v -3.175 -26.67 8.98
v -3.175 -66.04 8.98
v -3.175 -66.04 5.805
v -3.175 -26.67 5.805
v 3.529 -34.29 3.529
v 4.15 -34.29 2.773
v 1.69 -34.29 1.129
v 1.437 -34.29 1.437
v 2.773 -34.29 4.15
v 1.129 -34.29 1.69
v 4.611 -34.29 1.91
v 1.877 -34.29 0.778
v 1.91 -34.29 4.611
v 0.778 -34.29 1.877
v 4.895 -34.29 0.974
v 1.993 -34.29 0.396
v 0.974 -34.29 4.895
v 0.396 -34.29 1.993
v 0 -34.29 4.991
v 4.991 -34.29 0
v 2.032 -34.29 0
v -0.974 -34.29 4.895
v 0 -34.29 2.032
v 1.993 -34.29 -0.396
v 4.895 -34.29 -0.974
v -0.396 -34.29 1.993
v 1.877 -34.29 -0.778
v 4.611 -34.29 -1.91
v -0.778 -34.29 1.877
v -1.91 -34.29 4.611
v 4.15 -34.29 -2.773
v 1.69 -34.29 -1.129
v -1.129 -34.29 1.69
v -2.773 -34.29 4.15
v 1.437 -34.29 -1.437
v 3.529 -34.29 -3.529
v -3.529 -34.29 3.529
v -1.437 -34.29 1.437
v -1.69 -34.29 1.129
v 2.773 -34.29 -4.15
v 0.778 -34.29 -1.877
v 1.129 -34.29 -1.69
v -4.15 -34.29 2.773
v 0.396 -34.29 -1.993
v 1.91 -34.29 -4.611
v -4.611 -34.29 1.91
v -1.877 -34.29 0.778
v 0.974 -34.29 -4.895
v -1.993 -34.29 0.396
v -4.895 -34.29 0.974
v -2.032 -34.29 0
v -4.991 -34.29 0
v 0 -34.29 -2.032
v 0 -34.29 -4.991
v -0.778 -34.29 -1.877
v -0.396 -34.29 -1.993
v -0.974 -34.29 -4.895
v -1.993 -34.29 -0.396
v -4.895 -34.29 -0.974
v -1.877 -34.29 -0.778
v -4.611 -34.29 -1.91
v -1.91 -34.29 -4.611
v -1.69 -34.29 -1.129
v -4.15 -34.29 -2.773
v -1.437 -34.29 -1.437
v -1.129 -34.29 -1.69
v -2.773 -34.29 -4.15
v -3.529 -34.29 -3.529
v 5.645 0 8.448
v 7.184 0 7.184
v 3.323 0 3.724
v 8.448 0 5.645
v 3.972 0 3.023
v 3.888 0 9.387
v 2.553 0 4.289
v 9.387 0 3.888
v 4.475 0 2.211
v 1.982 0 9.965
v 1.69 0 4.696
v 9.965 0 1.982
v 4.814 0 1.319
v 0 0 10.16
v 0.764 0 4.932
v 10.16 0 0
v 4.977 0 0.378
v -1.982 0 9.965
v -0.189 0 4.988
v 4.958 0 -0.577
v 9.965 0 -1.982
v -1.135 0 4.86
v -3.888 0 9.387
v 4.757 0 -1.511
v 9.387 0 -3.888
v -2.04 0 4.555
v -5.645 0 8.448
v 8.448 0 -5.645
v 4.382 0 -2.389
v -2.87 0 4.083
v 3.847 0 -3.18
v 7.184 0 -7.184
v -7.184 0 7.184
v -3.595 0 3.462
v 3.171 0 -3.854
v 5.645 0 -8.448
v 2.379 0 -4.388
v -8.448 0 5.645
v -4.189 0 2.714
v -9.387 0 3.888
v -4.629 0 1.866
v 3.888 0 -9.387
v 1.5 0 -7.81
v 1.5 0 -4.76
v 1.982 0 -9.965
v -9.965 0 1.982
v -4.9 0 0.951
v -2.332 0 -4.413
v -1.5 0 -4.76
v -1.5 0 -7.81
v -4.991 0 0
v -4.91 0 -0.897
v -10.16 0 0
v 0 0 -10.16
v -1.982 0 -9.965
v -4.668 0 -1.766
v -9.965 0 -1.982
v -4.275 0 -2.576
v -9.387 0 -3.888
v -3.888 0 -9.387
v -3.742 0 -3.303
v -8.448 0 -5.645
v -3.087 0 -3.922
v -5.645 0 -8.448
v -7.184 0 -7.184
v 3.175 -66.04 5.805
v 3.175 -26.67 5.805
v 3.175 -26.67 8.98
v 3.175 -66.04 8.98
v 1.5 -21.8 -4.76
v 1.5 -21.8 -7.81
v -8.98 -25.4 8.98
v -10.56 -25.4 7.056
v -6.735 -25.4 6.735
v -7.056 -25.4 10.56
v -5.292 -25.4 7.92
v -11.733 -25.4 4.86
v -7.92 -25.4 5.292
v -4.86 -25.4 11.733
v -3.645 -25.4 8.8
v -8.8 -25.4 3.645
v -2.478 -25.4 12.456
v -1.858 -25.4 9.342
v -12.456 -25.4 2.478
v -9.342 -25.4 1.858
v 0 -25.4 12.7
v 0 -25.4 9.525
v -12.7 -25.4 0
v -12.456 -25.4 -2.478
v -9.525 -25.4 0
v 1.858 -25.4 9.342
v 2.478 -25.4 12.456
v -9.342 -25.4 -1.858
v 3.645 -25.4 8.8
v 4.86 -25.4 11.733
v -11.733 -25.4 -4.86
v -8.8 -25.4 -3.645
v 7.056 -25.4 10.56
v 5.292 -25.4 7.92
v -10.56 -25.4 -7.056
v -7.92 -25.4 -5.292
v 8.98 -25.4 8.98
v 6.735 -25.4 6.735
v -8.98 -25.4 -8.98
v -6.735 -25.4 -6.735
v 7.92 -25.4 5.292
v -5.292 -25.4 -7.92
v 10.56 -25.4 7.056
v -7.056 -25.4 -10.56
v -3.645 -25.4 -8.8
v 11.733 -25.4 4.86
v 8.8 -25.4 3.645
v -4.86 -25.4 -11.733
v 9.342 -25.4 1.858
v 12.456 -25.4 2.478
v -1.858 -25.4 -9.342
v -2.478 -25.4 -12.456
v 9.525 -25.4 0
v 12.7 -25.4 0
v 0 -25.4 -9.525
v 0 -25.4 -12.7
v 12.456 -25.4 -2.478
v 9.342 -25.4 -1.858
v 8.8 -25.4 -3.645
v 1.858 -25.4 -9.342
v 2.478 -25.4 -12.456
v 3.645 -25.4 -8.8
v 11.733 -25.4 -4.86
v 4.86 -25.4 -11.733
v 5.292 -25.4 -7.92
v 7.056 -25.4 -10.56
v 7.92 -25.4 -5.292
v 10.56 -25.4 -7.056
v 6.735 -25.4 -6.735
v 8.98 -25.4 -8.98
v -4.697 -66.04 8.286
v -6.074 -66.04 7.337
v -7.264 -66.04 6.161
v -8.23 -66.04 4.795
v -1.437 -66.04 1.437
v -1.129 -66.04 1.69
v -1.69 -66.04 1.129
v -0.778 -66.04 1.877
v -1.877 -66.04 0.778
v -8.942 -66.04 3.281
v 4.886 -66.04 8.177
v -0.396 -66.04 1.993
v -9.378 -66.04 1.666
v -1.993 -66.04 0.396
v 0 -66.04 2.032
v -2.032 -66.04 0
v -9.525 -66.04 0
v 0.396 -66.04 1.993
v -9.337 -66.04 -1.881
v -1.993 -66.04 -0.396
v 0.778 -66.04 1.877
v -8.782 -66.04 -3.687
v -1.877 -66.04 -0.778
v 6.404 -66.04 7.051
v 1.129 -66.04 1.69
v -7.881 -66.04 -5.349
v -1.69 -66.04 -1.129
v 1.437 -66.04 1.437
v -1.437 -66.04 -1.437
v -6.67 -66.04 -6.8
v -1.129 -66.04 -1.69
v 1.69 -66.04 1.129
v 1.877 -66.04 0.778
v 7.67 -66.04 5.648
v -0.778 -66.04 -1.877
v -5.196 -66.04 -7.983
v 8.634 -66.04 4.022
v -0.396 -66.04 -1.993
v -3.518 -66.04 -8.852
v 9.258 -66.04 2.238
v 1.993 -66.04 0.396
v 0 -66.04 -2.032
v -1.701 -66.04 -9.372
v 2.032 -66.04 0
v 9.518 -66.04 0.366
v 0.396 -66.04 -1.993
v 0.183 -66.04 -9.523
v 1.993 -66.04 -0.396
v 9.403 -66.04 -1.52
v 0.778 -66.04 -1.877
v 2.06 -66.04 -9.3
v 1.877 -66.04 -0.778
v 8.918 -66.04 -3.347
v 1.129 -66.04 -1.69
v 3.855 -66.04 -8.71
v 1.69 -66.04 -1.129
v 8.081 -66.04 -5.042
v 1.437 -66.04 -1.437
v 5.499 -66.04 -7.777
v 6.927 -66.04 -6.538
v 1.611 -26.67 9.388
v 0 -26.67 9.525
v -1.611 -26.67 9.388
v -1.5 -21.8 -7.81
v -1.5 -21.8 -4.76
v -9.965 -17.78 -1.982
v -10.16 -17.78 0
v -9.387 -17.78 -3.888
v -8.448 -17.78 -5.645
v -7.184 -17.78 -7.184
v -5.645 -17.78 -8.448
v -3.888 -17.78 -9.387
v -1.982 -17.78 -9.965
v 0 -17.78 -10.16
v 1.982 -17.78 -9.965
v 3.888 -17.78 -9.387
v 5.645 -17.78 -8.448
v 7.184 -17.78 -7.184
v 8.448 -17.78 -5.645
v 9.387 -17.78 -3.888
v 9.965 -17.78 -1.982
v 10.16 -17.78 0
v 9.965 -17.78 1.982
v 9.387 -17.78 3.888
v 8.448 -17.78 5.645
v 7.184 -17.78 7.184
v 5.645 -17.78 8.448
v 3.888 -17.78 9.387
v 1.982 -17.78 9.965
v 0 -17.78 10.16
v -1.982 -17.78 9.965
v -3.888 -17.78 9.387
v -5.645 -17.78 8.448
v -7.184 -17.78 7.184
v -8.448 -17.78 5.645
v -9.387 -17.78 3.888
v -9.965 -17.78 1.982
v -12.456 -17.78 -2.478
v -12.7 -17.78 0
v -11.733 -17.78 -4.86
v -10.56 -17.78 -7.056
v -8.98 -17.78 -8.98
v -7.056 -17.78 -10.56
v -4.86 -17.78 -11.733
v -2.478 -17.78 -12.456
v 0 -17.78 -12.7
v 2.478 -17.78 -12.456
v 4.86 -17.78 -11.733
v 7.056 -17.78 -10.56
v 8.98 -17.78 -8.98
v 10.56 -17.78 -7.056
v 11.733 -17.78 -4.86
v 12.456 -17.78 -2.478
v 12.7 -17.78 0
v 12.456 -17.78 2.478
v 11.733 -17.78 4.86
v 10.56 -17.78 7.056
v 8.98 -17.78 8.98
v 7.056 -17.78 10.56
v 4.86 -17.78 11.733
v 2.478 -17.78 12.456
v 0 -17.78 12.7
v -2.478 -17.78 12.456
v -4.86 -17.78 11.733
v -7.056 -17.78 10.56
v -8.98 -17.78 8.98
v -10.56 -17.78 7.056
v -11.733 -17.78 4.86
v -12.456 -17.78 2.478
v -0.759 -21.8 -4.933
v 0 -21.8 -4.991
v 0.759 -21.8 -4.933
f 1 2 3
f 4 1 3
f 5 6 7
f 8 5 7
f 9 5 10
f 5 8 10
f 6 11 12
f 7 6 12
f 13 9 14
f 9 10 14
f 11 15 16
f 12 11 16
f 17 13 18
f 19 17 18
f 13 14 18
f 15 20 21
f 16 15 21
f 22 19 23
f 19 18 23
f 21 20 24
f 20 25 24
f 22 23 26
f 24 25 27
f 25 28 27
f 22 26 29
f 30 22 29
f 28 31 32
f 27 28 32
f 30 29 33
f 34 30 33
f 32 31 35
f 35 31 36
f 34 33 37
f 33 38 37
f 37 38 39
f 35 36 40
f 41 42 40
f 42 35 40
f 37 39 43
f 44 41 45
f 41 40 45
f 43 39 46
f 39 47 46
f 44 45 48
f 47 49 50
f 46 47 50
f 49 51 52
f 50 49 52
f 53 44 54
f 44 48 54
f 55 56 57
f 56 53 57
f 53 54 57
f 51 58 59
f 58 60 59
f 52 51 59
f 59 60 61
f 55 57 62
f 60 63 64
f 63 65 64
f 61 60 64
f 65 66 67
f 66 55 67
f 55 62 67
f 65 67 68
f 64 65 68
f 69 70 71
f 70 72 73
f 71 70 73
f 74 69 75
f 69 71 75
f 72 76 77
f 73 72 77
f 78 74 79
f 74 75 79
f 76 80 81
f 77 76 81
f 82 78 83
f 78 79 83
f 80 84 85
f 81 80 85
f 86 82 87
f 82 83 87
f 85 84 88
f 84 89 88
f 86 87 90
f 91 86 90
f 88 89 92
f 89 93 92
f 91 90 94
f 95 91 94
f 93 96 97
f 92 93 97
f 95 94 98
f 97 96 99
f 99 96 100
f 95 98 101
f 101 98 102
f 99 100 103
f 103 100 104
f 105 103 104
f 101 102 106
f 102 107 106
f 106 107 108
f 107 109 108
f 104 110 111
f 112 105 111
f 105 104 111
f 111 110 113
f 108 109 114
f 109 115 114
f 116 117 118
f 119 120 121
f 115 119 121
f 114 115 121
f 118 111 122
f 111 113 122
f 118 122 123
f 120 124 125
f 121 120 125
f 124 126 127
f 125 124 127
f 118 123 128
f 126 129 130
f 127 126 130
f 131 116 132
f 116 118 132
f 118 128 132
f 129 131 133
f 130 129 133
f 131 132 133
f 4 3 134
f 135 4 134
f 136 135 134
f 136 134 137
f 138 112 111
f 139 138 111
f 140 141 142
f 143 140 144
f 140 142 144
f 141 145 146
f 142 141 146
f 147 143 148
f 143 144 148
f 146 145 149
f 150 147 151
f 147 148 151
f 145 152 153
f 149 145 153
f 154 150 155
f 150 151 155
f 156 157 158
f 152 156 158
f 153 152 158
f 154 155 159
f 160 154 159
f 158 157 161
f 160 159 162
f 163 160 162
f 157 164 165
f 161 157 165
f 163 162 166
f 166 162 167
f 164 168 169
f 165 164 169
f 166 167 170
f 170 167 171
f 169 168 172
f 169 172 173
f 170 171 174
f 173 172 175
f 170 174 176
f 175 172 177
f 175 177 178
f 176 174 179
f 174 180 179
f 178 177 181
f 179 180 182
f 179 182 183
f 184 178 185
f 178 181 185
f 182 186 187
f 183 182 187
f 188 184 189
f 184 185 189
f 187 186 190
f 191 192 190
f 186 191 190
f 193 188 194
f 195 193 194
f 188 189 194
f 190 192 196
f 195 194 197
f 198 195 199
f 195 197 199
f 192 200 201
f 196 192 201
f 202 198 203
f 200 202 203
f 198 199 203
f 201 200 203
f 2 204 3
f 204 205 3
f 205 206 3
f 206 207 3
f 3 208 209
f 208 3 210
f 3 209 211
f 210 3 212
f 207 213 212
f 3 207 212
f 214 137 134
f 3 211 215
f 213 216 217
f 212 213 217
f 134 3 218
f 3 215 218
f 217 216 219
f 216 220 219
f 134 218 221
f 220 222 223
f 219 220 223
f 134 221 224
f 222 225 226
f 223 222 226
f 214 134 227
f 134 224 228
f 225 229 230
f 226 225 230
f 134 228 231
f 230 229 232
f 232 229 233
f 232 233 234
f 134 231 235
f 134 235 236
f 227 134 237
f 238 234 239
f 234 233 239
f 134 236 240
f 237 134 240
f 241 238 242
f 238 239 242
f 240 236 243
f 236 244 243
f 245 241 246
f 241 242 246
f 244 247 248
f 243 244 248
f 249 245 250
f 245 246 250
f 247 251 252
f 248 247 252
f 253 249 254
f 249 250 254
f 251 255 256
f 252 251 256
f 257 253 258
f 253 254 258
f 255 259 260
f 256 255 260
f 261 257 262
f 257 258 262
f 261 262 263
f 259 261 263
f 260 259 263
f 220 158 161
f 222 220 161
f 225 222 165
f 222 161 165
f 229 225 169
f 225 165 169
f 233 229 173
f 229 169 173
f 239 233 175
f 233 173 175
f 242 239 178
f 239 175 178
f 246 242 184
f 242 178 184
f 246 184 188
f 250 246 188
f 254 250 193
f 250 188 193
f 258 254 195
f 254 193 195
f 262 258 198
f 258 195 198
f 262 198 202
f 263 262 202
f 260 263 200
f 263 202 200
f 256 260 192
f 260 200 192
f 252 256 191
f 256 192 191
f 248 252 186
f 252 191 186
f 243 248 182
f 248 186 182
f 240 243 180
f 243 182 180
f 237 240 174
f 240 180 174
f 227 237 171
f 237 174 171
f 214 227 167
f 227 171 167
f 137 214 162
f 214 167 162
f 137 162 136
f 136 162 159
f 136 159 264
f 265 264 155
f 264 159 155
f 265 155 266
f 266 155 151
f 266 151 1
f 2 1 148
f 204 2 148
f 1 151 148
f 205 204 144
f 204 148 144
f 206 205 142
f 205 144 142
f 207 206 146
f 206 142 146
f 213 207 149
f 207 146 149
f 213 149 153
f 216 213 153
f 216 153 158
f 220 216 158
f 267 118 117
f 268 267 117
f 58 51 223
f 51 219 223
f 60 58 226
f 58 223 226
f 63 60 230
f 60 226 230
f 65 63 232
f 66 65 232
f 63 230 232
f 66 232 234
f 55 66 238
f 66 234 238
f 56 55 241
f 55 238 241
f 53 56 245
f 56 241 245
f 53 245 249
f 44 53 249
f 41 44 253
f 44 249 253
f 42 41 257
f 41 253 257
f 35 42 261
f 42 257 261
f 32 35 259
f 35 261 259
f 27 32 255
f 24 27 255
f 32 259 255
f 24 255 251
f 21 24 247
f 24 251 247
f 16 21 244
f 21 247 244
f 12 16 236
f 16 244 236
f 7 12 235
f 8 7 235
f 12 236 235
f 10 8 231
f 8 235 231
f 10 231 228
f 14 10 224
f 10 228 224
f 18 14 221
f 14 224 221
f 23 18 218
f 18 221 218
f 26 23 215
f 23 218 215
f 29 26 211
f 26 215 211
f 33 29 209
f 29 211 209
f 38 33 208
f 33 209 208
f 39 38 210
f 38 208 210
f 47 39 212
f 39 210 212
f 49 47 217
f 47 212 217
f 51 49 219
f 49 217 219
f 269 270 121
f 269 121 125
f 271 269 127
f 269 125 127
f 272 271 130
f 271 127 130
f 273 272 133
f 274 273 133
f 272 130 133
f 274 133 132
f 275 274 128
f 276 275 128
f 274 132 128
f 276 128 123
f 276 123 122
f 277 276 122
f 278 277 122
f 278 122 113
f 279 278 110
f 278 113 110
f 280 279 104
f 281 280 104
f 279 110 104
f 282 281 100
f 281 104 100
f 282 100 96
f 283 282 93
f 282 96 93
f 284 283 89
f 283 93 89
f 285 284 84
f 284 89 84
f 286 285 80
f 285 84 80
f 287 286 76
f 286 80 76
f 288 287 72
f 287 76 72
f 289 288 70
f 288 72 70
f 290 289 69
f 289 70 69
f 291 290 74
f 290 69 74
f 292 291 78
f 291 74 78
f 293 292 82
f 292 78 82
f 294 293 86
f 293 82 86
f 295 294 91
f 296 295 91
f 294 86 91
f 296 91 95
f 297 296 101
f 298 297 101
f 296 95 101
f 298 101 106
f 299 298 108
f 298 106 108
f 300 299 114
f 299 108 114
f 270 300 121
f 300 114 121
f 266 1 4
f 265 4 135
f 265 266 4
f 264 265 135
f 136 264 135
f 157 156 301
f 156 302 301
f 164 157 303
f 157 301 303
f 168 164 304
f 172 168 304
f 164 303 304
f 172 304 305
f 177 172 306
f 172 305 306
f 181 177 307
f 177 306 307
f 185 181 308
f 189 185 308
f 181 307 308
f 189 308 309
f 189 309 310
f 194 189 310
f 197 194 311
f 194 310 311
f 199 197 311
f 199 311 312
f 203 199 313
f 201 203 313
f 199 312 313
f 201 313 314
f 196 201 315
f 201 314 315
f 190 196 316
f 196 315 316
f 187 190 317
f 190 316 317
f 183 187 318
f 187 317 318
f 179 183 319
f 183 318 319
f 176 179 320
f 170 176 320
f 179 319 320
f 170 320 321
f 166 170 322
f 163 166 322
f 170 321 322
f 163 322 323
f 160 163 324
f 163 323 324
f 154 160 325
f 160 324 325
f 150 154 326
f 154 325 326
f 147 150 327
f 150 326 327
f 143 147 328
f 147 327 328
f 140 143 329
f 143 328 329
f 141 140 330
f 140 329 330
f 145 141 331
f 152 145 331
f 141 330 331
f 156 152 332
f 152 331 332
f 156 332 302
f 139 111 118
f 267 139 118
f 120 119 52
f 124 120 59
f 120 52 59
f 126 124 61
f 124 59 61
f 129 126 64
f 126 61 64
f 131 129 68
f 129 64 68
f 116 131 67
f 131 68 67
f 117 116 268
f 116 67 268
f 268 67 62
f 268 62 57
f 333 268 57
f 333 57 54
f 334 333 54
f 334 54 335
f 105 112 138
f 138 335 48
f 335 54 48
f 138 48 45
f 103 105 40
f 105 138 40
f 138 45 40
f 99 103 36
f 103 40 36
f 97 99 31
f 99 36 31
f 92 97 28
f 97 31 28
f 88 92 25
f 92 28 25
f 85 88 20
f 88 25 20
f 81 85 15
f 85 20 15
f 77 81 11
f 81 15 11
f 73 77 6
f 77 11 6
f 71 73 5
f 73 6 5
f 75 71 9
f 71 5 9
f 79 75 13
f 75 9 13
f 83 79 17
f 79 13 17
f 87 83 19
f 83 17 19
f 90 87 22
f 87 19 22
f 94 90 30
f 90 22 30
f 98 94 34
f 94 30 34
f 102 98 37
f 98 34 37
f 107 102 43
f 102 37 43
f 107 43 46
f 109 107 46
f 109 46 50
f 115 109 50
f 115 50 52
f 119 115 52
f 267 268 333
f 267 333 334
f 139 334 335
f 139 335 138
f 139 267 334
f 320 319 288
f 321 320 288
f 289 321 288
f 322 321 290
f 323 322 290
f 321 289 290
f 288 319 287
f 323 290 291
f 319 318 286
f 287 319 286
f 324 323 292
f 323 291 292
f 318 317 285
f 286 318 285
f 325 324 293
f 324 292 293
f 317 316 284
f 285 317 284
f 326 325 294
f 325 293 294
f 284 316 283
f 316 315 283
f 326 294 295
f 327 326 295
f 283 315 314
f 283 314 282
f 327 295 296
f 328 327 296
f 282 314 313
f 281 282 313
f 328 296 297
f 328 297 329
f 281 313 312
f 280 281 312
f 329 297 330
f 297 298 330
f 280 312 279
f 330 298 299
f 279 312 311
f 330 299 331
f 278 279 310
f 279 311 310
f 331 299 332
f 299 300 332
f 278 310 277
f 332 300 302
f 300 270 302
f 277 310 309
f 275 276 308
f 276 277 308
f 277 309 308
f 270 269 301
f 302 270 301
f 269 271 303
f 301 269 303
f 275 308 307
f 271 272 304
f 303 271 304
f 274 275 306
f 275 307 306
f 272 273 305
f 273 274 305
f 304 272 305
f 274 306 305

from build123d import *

# Parameters (mm, degrees)
CUT_EXTRUDE1_DEPTH = 21.8
CUT_EXTRUDE2_DEPTH = 39.37


with BuildPart() as part:
    # Sketch2 → Revolve1 (revolve)
    with BuildSketch(Plane.XY):
        Polygon((-10.16, 0), (-4.9911, 0), (-4.9911, -34.29), (-2.032, -34.29), (-2.032, -66.04), (-9.525, -66.04), (-9.525, -25.4), (-12.7, -25.4), (-12.7, -17.78), (-10.16, -17.78), align=None)
    revolve(axis=Axis((0, 0, 0), (0, -1, 0)))

    # Sketch4 → Cut-Extrude1 (cut)
    with BuildSketch(Plane(origin=(0, 0, 0), x_dir=(1, 0, 0), z_dir=(0, 1, 0))):
        with BuildLine():
            Line((1.5, 4.760365449), (1.5, 7.81))
            Line((1.5, 7.81), (-1.5, 7.81))
            Line((-1.5, 7.81), (-1.5, 4.760365449))
            ThreePointArc((-1.5, 4.760365449), (0, 4.9911), (1.5, 4.760365449))
        make_face()
    extrude(amount=-CUT_EXTRUDE1_DEPTH, mode=Mode.SUBTRACT)

    # Sketch5 → Cut-Extrude2 (cut)
    with BuildSketch(Plane.XZ.offset(66.04)):
        with BuildLine():
            Line((-3.175, 8.980256121), (-3.175, 5.805256121))
            Line((-3.175, 5.805256121), (3.175, 5.805256121))
            Line((3.175, 5.805256121), (3.175, 8.980256121))
            ThreePointArc((3.175, 8.980256121), (0, 9.525), (-3.175, 8.980256121))
        make_face()
    extrude(amount=-CUT_EXTRUDE2_DEPTH, mode=Mode.SUBTRACT)


solid = part.part
